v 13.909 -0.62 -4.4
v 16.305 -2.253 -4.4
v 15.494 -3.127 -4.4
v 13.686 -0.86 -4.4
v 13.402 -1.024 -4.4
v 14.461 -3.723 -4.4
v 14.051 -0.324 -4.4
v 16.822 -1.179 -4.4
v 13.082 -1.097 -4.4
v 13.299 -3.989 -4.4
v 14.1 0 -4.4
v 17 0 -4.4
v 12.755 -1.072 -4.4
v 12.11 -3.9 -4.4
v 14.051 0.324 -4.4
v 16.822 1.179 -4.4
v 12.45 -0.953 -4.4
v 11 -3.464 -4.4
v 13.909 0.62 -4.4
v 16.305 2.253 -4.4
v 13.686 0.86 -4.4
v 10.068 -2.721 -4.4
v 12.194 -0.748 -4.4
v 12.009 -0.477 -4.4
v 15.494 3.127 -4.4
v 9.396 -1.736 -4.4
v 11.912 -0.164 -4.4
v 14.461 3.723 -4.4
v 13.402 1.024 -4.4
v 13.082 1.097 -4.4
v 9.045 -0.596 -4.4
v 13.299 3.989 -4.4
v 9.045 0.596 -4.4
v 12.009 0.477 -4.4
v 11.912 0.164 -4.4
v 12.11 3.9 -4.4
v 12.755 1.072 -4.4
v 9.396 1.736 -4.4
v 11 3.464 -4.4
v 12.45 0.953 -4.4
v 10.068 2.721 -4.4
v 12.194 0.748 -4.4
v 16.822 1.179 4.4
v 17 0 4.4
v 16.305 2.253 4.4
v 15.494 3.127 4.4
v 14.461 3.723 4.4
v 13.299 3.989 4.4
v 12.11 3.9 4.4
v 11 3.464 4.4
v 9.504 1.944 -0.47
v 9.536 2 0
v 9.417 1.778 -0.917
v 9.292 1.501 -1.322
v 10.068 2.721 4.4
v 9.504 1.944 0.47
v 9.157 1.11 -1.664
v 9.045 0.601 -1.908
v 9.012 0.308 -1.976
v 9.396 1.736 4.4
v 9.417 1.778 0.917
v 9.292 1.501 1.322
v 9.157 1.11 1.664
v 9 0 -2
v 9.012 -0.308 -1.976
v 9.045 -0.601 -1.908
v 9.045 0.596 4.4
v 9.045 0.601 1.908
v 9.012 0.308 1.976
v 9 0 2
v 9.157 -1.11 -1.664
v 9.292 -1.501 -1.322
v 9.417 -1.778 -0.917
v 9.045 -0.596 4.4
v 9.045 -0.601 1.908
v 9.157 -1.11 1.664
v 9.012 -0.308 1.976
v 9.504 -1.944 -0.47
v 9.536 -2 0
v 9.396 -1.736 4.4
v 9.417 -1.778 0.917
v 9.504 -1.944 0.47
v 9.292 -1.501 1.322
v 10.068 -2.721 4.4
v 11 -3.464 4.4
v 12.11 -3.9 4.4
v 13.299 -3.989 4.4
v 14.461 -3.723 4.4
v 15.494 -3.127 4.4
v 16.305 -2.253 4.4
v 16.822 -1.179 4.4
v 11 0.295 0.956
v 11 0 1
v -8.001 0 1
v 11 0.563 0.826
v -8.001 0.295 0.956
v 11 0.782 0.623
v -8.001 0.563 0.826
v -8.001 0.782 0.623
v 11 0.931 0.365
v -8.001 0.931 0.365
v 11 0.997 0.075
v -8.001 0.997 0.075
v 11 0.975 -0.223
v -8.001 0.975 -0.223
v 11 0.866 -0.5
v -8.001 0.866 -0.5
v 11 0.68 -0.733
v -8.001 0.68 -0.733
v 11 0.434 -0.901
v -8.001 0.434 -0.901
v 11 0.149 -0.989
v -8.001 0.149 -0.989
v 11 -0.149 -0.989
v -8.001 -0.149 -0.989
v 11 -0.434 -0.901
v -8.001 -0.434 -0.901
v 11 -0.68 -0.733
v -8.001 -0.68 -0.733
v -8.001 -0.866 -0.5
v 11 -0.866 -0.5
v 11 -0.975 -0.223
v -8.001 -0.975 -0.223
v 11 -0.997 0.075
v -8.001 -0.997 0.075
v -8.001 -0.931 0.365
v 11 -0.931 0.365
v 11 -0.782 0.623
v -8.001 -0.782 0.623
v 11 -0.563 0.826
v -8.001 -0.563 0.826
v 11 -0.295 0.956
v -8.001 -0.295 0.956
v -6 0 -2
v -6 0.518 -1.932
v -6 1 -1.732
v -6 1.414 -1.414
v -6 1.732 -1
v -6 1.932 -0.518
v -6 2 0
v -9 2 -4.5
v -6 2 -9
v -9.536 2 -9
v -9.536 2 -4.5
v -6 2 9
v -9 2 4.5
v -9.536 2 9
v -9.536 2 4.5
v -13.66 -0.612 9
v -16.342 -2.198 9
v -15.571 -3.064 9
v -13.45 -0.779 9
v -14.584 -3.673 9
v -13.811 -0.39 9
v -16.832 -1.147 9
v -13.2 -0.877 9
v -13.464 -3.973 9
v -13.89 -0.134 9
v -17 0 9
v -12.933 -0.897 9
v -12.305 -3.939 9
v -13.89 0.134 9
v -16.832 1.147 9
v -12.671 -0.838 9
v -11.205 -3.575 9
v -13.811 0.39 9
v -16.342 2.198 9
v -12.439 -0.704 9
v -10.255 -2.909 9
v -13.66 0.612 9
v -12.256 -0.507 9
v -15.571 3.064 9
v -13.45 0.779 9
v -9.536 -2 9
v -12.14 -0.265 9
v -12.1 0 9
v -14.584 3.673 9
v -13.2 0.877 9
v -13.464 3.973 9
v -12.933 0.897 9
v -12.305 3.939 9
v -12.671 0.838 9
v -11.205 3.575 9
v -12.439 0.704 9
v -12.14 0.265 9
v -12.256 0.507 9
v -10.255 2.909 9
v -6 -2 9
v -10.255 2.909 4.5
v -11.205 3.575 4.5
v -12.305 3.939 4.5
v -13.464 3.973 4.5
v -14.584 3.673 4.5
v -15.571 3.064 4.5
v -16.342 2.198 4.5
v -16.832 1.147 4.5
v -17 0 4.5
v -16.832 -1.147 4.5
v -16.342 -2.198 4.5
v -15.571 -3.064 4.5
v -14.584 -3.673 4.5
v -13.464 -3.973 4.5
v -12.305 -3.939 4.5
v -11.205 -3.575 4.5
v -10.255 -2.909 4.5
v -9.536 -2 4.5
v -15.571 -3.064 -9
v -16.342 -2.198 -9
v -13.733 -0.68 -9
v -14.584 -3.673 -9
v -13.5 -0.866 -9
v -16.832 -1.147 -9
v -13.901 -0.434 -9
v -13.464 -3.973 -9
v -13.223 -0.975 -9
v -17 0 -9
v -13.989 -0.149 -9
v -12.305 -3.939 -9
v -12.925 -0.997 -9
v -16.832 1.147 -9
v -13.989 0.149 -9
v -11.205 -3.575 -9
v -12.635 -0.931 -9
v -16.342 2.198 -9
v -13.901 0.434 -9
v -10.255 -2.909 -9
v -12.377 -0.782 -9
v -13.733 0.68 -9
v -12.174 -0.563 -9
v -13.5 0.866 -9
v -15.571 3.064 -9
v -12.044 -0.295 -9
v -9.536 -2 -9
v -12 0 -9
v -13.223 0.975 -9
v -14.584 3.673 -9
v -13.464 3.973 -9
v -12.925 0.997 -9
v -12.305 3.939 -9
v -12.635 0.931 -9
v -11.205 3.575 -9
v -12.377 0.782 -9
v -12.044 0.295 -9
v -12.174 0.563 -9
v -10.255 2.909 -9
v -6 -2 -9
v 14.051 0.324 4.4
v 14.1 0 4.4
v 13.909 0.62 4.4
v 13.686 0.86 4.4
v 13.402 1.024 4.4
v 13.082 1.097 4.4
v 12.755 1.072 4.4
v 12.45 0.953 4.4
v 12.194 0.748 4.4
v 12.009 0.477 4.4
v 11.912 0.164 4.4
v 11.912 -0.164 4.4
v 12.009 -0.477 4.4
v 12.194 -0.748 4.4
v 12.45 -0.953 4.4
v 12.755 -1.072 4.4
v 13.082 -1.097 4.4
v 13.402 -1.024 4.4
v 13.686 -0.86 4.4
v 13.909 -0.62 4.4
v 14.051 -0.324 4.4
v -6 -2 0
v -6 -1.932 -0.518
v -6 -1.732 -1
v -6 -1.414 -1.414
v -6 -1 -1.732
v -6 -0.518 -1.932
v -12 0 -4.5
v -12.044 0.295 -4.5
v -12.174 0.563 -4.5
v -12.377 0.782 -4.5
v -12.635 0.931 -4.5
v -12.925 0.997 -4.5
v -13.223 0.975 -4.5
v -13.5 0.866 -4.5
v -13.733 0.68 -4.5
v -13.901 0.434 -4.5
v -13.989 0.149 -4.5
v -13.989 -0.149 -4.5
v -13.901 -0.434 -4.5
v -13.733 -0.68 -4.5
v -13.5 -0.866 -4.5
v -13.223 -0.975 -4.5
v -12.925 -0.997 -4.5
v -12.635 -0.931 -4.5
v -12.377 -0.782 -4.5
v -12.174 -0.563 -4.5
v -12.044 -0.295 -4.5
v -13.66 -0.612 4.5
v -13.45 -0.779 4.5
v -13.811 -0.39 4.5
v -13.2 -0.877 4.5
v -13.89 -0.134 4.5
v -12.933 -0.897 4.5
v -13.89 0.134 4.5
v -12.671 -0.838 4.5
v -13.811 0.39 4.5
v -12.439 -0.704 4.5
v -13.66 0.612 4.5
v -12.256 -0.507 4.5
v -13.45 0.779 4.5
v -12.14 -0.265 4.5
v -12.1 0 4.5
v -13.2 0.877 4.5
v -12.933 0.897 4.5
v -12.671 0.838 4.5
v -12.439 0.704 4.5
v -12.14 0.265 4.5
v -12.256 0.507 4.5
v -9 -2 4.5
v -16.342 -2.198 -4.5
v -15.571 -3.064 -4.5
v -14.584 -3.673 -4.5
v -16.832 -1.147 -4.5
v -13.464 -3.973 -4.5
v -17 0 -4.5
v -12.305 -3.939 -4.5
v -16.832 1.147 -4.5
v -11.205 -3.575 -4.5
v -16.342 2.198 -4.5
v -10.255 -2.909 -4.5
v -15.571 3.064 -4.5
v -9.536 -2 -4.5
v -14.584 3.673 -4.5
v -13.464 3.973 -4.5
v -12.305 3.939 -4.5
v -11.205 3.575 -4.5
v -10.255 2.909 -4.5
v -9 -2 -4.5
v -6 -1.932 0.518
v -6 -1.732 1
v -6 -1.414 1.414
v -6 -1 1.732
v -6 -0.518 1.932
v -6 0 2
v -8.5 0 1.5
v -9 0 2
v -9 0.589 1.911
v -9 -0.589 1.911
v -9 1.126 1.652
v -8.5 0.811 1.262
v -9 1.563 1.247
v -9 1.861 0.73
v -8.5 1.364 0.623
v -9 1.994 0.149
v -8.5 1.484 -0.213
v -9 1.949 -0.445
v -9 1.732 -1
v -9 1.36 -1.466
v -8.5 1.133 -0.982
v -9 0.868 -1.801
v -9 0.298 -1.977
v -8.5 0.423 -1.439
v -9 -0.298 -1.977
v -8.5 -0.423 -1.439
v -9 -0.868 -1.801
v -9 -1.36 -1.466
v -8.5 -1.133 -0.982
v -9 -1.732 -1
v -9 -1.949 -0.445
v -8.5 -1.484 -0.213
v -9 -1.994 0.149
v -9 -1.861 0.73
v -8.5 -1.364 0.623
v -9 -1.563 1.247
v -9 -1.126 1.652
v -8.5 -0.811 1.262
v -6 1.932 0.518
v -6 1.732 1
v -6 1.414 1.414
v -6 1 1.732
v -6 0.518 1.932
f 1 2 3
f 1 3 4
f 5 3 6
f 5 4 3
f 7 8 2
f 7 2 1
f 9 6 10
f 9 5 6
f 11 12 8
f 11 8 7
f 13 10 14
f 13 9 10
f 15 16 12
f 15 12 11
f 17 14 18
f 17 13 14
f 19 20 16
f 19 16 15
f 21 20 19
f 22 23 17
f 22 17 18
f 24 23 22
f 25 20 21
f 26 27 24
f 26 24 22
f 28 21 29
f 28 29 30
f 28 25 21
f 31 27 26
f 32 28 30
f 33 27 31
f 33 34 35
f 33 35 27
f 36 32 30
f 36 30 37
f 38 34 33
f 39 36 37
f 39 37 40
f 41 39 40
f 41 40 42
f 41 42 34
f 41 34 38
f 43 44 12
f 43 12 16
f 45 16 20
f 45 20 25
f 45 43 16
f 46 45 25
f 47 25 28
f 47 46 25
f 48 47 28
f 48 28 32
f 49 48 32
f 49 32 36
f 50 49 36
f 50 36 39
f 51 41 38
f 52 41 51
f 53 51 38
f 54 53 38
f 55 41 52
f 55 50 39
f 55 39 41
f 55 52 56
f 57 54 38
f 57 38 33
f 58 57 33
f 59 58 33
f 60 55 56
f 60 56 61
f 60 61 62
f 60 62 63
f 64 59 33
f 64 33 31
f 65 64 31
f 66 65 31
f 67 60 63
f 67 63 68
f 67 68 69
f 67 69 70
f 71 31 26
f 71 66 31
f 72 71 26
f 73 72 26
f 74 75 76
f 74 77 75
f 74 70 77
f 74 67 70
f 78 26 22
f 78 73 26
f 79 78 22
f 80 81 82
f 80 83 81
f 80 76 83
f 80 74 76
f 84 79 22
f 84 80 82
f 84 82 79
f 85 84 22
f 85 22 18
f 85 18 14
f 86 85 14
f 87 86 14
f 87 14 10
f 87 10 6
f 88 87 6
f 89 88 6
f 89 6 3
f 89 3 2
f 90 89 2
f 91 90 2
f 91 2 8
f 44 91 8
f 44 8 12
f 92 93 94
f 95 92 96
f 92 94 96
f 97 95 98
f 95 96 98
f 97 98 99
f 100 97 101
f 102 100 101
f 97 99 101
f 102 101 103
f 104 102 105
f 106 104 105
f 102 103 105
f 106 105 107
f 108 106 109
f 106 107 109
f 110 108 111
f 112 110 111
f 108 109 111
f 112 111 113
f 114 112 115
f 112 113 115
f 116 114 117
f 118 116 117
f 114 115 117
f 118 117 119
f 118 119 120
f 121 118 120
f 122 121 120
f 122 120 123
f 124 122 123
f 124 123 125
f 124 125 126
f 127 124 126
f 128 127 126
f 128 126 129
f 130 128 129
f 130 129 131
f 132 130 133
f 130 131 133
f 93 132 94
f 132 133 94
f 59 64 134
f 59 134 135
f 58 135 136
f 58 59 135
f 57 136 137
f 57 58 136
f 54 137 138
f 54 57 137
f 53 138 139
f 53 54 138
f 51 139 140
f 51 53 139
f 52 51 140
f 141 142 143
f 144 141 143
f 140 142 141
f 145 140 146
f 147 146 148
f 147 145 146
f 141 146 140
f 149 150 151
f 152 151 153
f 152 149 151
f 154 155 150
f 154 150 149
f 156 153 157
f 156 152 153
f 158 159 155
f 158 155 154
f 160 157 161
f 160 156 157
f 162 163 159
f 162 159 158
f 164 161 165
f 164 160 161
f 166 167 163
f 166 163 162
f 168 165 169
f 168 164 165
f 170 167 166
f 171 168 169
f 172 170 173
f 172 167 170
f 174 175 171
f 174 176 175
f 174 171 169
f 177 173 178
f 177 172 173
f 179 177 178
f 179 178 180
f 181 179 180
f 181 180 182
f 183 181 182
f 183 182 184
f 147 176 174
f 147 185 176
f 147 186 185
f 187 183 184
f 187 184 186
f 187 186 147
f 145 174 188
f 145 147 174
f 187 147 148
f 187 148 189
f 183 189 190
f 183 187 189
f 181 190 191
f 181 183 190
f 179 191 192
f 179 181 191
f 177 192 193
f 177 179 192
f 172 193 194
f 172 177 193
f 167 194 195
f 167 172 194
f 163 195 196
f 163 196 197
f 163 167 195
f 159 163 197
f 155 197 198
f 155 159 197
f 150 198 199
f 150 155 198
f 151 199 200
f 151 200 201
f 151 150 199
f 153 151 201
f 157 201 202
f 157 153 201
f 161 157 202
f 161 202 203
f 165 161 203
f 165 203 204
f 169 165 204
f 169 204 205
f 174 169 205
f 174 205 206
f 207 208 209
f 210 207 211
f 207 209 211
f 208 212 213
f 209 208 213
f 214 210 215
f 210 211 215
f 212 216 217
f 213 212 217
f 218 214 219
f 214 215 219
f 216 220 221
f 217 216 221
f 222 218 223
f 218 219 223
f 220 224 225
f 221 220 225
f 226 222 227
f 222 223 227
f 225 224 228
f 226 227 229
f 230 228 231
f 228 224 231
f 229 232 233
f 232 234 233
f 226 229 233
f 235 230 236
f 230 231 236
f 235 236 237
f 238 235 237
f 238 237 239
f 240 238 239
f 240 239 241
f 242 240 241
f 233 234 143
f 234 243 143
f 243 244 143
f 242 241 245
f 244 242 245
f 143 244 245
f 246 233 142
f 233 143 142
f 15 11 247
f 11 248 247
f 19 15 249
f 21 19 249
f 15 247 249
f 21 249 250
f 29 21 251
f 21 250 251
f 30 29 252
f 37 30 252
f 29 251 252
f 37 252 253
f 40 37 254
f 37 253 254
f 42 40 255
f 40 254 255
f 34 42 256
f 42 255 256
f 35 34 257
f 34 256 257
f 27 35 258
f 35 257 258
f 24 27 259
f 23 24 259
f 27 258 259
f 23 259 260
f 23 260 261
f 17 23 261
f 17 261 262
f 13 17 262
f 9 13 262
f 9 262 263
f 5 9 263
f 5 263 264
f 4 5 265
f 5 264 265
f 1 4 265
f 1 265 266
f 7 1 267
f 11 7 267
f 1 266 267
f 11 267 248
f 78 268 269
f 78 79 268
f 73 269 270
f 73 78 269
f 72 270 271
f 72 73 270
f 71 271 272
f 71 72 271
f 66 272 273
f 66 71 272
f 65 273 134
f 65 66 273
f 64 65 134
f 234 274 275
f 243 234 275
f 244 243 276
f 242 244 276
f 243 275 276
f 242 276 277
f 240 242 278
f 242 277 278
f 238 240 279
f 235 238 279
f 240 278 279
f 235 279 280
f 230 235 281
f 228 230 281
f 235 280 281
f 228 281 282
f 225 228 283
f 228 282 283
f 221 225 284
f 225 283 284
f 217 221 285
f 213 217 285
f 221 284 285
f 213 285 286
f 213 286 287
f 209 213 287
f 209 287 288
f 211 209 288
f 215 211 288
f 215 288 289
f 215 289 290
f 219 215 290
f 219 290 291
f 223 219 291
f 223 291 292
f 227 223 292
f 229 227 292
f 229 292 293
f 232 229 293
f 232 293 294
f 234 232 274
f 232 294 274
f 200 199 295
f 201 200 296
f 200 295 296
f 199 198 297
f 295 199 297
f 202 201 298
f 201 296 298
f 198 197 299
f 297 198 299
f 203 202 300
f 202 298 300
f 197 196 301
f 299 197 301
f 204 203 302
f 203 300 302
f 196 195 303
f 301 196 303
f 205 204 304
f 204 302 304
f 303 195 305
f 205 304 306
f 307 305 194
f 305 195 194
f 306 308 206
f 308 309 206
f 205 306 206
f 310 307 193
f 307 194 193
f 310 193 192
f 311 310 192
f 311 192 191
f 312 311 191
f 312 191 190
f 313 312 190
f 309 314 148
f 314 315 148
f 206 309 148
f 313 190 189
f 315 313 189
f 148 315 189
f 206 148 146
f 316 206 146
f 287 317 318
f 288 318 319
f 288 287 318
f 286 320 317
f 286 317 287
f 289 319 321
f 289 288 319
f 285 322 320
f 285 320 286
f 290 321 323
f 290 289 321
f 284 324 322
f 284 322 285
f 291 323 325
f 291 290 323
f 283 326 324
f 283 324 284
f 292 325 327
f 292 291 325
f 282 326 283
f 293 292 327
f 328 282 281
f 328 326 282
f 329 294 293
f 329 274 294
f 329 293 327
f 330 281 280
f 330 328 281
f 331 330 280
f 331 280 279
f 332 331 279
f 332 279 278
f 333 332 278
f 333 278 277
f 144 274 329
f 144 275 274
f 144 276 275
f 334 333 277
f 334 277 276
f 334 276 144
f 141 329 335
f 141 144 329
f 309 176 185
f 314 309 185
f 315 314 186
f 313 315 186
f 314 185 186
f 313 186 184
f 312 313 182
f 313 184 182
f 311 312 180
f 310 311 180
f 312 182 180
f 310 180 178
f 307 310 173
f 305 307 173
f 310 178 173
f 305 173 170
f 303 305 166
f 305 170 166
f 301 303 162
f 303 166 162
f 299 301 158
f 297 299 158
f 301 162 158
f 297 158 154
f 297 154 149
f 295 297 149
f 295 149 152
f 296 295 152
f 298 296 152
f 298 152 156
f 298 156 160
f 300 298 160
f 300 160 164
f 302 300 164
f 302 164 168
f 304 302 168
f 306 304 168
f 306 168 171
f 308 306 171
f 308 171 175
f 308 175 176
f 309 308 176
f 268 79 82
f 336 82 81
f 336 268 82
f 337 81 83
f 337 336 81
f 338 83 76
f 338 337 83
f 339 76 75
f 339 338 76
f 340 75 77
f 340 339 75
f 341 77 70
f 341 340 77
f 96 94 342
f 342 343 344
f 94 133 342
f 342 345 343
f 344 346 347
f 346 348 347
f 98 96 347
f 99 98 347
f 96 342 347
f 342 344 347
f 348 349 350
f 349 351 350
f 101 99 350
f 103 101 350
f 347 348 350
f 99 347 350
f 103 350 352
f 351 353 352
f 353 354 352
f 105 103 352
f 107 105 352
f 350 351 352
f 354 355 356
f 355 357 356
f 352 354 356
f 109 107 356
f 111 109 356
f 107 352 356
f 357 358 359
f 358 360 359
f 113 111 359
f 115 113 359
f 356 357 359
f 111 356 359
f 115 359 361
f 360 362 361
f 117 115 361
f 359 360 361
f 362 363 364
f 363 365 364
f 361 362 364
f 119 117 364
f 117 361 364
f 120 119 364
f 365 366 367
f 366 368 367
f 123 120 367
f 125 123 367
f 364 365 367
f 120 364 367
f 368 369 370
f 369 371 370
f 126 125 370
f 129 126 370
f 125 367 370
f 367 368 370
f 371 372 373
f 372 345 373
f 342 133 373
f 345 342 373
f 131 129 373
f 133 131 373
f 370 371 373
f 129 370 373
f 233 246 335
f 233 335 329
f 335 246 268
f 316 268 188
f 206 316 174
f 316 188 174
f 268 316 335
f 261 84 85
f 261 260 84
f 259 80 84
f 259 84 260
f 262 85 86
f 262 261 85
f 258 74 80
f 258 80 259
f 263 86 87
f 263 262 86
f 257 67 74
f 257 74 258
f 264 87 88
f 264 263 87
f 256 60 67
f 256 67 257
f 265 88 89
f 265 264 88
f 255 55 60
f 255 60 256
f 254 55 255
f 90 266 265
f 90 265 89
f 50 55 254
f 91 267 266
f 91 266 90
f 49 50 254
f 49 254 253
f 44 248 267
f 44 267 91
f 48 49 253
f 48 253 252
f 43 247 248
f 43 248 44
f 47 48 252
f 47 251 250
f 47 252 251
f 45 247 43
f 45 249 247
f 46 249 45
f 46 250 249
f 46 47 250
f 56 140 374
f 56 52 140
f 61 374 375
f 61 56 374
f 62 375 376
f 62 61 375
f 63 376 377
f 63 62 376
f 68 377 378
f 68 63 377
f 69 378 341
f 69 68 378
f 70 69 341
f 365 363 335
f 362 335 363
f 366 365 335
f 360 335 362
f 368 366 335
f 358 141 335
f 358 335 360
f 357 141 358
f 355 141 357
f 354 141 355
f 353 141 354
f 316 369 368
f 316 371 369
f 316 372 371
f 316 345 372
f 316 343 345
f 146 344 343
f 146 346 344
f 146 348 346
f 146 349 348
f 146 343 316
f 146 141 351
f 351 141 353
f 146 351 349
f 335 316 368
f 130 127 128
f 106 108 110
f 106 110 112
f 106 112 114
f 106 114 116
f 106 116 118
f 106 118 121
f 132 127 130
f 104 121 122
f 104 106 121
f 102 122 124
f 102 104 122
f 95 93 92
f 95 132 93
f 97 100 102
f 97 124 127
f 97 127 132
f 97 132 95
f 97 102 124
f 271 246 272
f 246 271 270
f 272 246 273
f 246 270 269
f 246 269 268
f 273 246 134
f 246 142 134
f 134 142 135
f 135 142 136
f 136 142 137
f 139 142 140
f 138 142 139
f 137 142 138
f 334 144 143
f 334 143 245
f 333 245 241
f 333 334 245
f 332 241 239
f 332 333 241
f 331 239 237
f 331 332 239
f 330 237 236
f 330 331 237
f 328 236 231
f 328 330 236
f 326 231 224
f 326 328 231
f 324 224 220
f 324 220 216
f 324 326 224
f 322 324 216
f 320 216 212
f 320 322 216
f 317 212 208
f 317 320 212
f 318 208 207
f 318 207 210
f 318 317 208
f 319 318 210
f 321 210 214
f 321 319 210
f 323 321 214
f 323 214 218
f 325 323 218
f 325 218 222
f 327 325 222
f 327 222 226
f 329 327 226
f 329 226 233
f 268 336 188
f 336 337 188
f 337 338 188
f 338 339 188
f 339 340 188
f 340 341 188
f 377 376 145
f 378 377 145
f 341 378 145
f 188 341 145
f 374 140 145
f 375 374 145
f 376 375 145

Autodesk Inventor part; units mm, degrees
ref_plane "YZ Plane" through (0, 0, 0) normal (1, 0, 0) x (0, 1, 0)
ref_plane "XZ Plane" through (0, 0, 0) normal (0, 1, 0) x (-1, 0, 0)
ref_plane "XY Plane" through (0, 0, 0) normal (0, 0, 1) x (1, 0, 0)
sketch "Sketch1" plane through (0, 0, 0) normal (0, 0, 1) x (1, 0, 0)
  circle A0 centre (-13, 0) radius 1
  circle A1 centre (13, 0) radius 1
  circle A2 centre (-13, 0) radius 4
  circle A3 centre (13, 0) radius 4
  point P0 (0, 0)
  dimension "d0" = 2
  dimension "d1" = 2
  dimension "d3" = 26
  dimension "d4" = 13
  dimension "d5" = 8
  dimension "d6" = 8
extrude "Extrusion1" add sketch "Sketch1" against normal mid plane 18
sketch "Sketch2" plane through (0, 0, 0) normal (0, 0, 1) x (1, 0, 0)
  circle A0 centre (-13, 0) radius 4 projected
  circle A1 centre (-13, 0) radius 1 projected
  point P0 (0, 0)
extrude "Extrusion2" cut sketch "Sketch2" against normal mid plane 9
sketch "Sketch3" plane through (-13, 0, -4.5) normal (0, 0, 1) x (1, 0, 0)
  circle A0 centre (26, 0) radius 4 projected
  circle A1 centre (26, 0) radius 4 projected
  circle A2 centre (26, 0) radius 1 projected
  point P0 (13, 0)
extrude "Extrusion3" cut sketch "Sketch3" against normal blind 4.5
mirror "Mirror1" about plane through (0, 0, 0) normal (0, 0, 1) of "Extrusion3"
sketch "Sketch6" plane through (0, 0, 0) normal (0, 1, 0) x (-1, 0, 0)
  line L0 (-9, -4.5) -> (-12, -4.5) construction
  line L1 (-12, -4.5) -> (-12, 4.5) construction
  line L2 (-12, 4.5) -> (-9, 4.5) construction
  line L3 (-9, 4.5) -> (-9, -4.5) construction
  line L4 (-14, -4.5) -> (-17, -4.5) construction
  line L5 (-17, -4.5) -> (-17, 4.5) construction
  line L6 (-17, 4.5) -> (-14, 4.5) construction
  line L7 (-14, 4.5) -> (-14, -4.5) construction
  line L8 (9, 9) -> (12, 9) construction
  line L9 (12, 9) -> (12, 4.5) construction
  line L10 (12, 4.5) -> (9, 4.5) construction
  line L11 (9, 4.5) -> (9, 9) construction
  line L12 (14, 9) -> (17, 9) construction
  line L13 (17, 9) -> (17, 4.5) construction
  line L14 (17, 4.5) -> (14, 4.5) construction
  line L15 (14, 4.5) -> (14, 9) construction
  line L16 (17, -9) -> (14, -9) construction
  line L17 (14, -9) -> (14, -4.5) construction
  line L18 (14, -4.5) -> (17, -4.5) construction
  line L19 (17, -4.5) -> (17, -9) construction
  line L20 (12, -9) -> (9, -9) construction
  line L21 (9, -9) -> (9, -4.5) construction
  line L22 (9, -4.5) -> (12, -4.5) construction
  line L23 (12, -4.5) -> (12, -9) construction
  line L24 (9, -9) -> (17, -9) construction
  line L25 (9, -9) -> (6, -9)
  line L26 (6, -9) -> (6, -2)
  line L27 (6, -2) -> (-9, -2)
  line L28 (-9, 4.5) -> (-9, -4.5) construction
  line L29 (-9, 2) -> (6, 2)
  line L30 (6, 2) -> (6, 9)
  line L31 (6, 9) -> (9, 9)
  line L32 (9, -4.5) -> (17, -4.5) construction
  line L33 (9, -4.5) -> (9, 4.5)
  line L34 (-9, -2) -> (-12, -2)
  line L35 (-12, -4.5) -> (-12, 4.5) projected
  line L36 (-9, 2) -> (-12, 2)
  line L37 (9, -9) -> (12, -9)
  line L38 (12, -4.5) -> (9, -4.5)
  line L39 (14, -4.5) -> (12, -4.5) projected
  line L40 (12, -4.5) -> (12, -9)
  line L41 (12, -9) -> (12, -4.5) projected
  line L42 (12, 4.5) -> (14, 4.5) projected
  line L43 (17, 4.5) -> (9, 4.5) projected
  line L44 (12, 4.5) -> (9, 4.5)
  line L45 (12, 9) -> (14, 9) projected
  line L46 (12, 4.5) -> (12, 9)
  line L47 (17, 9) -> (9, 9) projected
  line L48 (12, 9) -> (9, 9)
  point P0 (0, 0)
  dimension "d16" = 3
  dimension "d17" = 4
  dimension "d18" = 2
extrude "Extrusion4" add sketch "Sketch6" against normal mid plane 4
sketch "Sketch7" plane through (-9, -2, -4.5) normal (-1, 0, 0) x (0, 0, 1)
  circle A0 centre (4.5, 2) radius 1
  dimension "d21" = 2
extrude "Extrusion5" cut sketch "Sketch7" against normal blind 20
chamfer "Chamfer1" distance 1 angle 45 1 edges at (-9, 0, -1)
fillet "Fillet1" radius 2 4 edges at (1.7679, 2, 2) (1.7679, 2, -2) (1.7679, -2, -2) (1.7679, -2, 2)
sketch "Sketch9" plane through (0, 0, 9) normal (0, 0, 1) x (1, 0, 0)
  circle A0 centre (-13, 0) radius 1 projected
  circle A1 centre (-13, 0) radius 0.9
  point P0 (0, 0)
  dimension "d29" = 1.8
extrude "TREAD" add sketch "Sketch9" against normal up to surface (4.5 mm away)
sketch "Sketch11" plane through (13, 0, 4.5) normal (0, 0, 1) x (1, 0, 0)
  circle A0 centre (0, 0) radius 4 projected
  circle A1 centre (0, 0) radius 1 projected
  point P0 (-13, 0)
extrude "thin" cut sketch "Sketch11" against normal blind 0.1
mirror "Mirror2" about plane through (0, 0, 0) normal (0, 0, 1) of "thin"
sketch "Sketch12" plane through (13, 0, 4.4) normal (0, 0, 1) x (1, 0, 0)
  circle A0 centre (0, 0) radius 1 construction
  circle A1 centre (0, 0) radius 1.1
  point P0 (-13, 0)
  dimension "d34" = 2.2
extrude "Extrusion8" cut sketch "Sketch12" against normal up to surface (8.8 mm away)
equation "\"d4\" = 0.5 * d3"
equation "\"d6\" = d5"
equation "\"d18\" = 0.5 * d17"
properties part number "tOLERNECED_Phalalnge_28mm"
